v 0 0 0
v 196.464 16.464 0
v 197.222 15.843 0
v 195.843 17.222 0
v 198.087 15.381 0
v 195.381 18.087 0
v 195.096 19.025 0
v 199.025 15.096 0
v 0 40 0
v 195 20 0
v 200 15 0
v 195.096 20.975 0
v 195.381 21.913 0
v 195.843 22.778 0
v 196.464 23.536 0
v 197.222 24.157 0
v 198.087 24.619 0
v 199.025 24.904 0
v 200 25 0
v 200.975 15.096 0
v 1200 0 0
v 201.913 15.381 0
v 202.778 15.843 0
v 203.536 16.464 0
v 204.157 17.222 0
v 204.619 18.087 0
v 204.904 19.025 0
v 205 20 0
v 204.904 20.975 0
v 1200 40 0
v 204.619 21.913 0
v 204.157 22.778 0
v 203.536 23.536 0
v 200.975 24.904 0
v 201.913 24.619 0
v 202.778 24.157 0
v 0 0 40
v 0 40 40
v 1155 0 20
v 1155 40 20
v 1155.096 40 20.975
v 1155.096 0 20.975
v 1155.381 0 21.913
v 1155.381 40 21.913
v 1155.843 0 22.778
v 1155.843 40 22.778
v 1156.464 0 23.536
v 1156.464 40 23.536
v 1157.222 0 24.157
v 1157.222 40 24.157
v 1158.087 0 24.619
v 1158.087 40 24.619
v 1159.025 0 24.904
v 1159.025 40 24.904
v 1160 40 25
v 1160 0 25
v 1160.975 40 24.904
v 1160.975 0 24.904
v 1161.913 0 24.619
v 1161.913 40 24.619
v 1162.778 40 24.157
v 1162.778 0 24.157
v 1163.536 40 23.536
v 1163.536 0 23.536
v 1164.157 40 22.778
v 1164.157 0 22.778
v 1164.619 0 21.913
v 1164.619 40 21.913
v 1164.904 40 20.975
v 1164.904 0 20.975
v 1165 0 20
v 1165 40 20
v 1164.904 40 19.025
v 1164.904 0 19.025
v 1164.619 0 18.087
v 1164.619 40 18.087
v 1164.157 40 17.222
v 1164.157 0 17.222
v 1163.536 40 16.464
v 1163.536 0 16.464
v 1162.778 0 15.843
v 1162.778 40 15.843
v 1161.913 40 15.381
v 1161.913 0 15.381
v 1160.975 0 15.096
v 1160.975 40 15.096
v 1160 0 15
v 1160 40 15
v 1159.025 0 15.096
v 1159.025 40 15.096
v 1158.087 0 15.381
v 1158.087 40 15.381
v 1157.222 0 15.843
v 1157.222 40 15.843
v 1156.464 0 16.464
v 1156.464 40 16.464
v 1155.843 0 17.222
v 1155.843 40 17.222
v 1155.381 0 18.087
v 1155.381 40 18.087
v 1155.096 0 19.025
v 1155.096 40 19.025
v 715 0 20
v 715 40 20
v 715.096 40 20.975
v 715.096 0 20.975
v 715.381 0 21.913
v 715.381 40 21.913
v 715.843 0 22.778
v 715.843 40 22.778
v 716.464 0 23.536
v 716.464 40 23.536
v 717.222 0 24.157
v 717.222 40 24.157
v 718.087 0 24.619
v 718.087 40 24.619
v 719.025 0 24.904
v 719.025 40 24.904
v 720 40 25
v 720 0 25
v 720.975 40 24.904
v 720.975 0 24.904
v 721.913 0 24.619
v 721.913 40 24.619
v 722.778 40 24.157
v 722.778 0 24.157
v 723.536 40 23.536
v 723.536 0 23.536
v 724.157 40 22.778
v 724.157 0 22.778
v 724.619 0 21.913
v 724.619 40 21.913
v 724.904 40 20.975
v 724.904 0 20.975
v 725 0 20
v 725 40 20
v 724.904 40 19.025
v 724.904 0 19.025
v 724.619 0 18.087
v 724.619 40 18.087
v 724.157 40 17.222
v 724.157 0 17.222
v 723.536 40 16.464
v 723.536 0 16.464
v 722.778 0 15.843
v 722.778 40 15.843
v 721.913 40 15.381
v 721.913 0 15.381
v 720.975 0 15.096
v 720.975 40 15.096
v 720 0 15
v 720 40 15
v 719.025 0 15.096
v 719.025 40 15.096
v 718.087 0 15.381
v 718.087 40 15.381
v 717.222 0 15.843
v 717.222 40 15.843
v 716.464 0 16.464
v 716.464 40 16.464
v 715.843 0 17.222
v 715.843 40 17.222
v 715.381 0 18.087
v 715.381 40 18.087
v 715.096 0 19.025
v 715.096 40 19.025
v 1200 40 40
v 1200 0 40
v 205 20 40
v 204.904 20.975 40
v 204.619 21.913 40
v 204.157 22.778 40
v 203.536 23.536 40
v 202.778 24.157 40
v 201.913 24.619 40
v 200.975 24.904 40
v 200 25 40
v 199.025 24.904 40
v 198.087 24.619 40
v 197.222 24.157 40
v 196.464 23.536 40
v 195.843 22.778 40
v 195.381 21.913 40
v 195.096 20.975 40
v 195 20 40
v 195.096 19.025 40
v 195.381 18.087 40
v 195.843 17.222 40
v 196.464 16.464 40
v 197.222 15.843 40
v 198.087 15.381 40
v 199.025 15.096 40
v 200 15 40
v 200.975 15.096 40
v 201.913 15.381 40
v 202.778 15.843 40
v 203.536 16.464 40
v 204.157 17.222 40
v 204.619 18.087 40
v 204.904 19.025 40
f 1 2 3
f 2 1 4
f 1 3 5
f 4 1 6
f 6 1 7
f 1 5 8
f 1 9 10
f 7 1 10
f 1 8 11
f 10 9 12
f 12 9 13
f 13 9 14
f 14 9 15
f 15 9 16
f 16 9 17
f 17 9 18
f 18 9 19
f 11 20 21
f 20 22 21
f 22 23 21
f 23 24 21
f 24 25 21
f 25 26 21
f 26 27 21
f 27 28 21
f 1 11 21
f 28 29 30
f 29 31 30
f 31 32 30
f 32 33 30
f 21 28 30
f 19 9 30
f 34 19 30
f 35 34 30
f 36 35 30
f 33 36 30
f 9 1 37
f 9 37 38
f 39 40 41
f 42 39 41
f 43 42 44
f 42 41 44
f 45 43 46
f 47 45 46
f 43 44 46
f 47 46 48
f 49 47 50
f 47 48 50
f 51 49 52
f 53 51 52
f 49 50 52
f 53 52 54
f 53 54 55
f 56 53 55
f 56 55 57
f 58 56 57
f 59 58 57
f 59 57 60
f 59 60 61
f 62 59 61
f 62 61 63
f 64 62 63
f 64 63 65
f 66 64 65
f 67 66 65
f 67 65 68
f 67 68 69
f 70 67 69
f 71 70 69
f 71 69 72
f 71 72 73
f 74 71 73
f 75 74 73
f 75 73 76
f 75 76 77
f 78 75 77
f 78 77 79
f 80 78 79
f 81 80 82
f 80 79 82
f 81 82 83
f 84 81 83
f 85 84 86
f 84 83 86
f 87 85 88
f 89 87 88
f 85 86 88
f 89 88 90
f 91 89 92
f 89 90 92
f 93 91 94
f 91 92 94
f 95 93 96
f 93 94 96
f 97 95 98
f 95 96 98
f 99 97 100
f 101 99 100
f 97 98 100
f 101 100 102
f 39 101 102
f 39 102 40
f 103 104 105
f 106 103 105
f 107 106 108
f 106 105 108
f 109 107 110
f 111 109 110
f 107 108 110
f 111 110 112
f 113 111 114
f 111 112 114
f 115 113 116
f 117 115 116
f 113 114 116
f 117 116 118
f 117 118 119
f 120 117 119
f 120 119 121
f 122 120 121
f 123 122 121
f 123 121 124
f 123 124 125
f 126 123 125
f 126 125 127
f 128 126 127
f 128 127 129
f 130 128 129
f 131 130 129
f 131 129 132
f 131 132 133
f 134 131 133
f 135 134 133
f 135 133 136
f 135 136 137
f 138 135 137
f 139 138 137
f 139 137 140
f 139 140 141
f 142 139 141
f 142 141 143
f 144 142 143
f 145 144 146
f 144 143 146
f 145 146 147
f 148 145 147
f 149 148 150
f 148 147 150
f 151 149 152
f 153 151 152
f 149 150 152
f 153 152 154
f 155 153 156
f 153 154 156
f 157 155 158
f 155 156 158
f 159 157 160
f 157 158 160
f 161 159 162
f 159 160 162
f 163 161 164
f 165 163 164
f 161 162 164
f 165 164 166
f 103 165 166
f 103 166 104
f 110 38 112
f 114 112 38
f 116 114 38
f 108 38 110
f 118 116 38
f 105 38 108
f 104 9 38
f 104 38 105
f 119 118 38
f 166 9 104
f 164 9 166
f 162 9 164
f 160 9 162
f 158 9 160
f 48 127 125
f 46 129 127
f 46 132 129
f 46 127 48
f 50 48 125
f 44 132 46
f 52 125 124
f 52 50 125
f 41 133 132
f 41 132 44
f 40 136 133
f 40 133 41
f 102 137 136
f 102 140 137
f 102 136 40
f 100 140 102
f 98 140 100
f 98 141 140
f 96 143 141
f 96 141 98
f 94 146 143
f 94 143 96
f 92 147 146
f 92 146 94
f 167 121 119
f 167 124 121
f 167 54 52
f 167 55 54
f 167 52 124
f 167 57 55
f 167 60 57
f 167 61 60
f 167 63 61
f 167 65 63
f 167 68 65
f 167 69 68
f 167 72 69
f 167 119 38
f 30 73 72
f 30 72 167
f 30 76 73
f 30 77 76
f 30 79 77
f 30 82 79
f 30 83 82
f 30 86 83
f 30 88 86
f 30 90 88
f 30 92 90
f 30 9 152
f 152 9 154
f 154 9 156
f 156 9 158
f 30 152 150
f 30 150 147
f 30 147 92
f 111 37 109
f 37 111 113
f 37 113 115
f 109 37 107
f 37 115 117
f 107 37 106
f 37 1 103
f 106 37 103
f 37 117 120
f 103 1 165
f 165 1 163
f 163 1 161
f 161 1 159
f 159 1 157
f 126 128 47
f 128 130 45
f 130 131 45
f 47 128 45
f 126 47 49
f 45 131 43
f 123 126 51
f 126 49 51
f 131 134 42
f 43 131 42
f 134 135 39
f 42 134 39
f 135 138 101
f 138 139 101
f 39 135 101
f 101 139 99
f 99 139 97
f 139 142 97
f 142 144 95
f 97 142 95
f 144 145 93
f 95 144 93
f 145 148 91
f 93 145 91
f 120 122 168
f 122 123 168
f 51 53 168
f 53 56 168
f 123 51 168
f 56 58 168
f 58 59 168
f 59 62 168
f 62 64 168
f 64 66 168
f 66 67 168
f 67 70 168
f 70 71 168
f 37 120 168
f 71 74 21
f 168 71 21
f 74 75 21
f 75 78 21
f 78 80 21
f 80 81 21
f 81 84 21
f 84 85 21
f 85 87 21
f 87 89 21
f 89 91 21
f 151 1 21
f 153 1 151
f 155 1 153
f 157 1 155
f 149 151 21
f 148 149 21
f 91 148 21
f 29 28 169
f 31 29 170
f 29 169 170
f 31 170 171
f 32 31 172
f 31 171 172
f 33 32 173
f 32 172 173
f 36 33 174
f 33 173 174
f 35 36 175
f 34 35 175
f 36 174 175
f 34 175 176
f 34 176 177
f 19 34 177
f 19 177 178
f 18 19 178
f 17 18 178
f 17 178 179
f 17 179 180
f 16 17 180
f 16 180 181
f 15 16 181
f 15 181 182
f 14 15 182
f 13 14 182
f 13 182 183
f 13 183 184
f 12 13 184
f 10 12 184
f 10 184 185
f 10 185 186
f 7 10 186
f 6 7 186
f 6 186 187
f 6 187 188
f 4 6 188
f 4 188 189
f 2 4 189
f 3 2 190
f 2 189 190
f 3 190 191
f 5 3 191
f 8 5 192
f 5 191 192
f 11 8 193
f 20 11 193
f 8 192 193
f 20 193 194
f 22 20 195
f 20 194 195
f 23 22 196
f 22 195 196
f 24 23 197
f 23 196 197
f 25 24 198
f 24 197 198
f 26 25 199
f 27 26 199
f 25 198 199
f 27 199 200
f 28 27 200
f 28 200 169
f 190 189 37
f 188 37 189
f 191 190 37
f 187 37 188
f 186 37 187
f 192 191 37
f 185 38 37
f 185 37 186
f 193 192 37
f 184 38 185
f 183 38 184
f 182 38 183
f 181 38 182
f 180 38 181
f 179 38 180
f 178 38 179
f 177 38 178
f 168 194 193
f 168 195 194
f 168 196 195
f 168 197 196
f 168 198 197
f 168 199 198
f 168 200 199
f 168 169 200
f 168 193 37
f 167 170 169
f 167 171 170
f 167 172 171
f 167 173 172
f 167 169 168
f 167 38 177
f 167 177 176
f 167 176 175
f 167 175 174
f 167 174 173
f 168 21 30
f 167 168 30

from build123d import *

# Parameters (mm, degrees)
SCHIZZO1_W                   = 1200
SCHIZZO1_H                   = 40
ESTRUSIONE_ESTRUSIONE1_DEPTH = 40
SCHIZZO2_R                   = 5
TAGLIO_ESTRUSIONE1_DEPTH     = 1202.332593414
SCHIZZO3_R                   = 5
TAGLIO_ESTRUSIONE2_DEPTH     = 1202.332593414


with BuildPart() as part:
    # Schizzo1 → Estrusione-Estrusione1 (new body)
    with BuildSketch(Plane.XY):
        with Locations((600, 20)):
            Rectangle(SCHIZZO1_W, SCHIZZO1_H)
    extrude(amount=ESTRUSIONE_ESTRUSIONE1_DEPTH)

    # Schizzo2 → Taglio-Estrusione1 (cut, through all)
    with BuildSketch(Plane.XY.offset(40)):
        with Locations((200, 20)):
            Circle(SCHIZZO2_R)
    extrude(amount=-TAGLIO_ESTRUSIONE1_DEPTH, mode=Mode.SUBTRACT)

    # Schizzo3 → Taglio-Estrusione2 (cut, through all)
    with BuildSketch(Plane(origin=(0, 40, 0), x_dir=(1, 0, 0), z_dir=(0, 1, 0))):
        with Locations(Location((1160, -20, 0), (0, 0, 180))):
            Circle(SCHIZZO3_R)
        with Locations(Location((720, -20, 0), (0, 0, 180))):
            Circle(SCHIZZO3_R)
    extrude(amount=-TAGLIO_ESTRUSIONE2_DEPTH, mode=Mode.SUBTRACT)


solid = part.part
